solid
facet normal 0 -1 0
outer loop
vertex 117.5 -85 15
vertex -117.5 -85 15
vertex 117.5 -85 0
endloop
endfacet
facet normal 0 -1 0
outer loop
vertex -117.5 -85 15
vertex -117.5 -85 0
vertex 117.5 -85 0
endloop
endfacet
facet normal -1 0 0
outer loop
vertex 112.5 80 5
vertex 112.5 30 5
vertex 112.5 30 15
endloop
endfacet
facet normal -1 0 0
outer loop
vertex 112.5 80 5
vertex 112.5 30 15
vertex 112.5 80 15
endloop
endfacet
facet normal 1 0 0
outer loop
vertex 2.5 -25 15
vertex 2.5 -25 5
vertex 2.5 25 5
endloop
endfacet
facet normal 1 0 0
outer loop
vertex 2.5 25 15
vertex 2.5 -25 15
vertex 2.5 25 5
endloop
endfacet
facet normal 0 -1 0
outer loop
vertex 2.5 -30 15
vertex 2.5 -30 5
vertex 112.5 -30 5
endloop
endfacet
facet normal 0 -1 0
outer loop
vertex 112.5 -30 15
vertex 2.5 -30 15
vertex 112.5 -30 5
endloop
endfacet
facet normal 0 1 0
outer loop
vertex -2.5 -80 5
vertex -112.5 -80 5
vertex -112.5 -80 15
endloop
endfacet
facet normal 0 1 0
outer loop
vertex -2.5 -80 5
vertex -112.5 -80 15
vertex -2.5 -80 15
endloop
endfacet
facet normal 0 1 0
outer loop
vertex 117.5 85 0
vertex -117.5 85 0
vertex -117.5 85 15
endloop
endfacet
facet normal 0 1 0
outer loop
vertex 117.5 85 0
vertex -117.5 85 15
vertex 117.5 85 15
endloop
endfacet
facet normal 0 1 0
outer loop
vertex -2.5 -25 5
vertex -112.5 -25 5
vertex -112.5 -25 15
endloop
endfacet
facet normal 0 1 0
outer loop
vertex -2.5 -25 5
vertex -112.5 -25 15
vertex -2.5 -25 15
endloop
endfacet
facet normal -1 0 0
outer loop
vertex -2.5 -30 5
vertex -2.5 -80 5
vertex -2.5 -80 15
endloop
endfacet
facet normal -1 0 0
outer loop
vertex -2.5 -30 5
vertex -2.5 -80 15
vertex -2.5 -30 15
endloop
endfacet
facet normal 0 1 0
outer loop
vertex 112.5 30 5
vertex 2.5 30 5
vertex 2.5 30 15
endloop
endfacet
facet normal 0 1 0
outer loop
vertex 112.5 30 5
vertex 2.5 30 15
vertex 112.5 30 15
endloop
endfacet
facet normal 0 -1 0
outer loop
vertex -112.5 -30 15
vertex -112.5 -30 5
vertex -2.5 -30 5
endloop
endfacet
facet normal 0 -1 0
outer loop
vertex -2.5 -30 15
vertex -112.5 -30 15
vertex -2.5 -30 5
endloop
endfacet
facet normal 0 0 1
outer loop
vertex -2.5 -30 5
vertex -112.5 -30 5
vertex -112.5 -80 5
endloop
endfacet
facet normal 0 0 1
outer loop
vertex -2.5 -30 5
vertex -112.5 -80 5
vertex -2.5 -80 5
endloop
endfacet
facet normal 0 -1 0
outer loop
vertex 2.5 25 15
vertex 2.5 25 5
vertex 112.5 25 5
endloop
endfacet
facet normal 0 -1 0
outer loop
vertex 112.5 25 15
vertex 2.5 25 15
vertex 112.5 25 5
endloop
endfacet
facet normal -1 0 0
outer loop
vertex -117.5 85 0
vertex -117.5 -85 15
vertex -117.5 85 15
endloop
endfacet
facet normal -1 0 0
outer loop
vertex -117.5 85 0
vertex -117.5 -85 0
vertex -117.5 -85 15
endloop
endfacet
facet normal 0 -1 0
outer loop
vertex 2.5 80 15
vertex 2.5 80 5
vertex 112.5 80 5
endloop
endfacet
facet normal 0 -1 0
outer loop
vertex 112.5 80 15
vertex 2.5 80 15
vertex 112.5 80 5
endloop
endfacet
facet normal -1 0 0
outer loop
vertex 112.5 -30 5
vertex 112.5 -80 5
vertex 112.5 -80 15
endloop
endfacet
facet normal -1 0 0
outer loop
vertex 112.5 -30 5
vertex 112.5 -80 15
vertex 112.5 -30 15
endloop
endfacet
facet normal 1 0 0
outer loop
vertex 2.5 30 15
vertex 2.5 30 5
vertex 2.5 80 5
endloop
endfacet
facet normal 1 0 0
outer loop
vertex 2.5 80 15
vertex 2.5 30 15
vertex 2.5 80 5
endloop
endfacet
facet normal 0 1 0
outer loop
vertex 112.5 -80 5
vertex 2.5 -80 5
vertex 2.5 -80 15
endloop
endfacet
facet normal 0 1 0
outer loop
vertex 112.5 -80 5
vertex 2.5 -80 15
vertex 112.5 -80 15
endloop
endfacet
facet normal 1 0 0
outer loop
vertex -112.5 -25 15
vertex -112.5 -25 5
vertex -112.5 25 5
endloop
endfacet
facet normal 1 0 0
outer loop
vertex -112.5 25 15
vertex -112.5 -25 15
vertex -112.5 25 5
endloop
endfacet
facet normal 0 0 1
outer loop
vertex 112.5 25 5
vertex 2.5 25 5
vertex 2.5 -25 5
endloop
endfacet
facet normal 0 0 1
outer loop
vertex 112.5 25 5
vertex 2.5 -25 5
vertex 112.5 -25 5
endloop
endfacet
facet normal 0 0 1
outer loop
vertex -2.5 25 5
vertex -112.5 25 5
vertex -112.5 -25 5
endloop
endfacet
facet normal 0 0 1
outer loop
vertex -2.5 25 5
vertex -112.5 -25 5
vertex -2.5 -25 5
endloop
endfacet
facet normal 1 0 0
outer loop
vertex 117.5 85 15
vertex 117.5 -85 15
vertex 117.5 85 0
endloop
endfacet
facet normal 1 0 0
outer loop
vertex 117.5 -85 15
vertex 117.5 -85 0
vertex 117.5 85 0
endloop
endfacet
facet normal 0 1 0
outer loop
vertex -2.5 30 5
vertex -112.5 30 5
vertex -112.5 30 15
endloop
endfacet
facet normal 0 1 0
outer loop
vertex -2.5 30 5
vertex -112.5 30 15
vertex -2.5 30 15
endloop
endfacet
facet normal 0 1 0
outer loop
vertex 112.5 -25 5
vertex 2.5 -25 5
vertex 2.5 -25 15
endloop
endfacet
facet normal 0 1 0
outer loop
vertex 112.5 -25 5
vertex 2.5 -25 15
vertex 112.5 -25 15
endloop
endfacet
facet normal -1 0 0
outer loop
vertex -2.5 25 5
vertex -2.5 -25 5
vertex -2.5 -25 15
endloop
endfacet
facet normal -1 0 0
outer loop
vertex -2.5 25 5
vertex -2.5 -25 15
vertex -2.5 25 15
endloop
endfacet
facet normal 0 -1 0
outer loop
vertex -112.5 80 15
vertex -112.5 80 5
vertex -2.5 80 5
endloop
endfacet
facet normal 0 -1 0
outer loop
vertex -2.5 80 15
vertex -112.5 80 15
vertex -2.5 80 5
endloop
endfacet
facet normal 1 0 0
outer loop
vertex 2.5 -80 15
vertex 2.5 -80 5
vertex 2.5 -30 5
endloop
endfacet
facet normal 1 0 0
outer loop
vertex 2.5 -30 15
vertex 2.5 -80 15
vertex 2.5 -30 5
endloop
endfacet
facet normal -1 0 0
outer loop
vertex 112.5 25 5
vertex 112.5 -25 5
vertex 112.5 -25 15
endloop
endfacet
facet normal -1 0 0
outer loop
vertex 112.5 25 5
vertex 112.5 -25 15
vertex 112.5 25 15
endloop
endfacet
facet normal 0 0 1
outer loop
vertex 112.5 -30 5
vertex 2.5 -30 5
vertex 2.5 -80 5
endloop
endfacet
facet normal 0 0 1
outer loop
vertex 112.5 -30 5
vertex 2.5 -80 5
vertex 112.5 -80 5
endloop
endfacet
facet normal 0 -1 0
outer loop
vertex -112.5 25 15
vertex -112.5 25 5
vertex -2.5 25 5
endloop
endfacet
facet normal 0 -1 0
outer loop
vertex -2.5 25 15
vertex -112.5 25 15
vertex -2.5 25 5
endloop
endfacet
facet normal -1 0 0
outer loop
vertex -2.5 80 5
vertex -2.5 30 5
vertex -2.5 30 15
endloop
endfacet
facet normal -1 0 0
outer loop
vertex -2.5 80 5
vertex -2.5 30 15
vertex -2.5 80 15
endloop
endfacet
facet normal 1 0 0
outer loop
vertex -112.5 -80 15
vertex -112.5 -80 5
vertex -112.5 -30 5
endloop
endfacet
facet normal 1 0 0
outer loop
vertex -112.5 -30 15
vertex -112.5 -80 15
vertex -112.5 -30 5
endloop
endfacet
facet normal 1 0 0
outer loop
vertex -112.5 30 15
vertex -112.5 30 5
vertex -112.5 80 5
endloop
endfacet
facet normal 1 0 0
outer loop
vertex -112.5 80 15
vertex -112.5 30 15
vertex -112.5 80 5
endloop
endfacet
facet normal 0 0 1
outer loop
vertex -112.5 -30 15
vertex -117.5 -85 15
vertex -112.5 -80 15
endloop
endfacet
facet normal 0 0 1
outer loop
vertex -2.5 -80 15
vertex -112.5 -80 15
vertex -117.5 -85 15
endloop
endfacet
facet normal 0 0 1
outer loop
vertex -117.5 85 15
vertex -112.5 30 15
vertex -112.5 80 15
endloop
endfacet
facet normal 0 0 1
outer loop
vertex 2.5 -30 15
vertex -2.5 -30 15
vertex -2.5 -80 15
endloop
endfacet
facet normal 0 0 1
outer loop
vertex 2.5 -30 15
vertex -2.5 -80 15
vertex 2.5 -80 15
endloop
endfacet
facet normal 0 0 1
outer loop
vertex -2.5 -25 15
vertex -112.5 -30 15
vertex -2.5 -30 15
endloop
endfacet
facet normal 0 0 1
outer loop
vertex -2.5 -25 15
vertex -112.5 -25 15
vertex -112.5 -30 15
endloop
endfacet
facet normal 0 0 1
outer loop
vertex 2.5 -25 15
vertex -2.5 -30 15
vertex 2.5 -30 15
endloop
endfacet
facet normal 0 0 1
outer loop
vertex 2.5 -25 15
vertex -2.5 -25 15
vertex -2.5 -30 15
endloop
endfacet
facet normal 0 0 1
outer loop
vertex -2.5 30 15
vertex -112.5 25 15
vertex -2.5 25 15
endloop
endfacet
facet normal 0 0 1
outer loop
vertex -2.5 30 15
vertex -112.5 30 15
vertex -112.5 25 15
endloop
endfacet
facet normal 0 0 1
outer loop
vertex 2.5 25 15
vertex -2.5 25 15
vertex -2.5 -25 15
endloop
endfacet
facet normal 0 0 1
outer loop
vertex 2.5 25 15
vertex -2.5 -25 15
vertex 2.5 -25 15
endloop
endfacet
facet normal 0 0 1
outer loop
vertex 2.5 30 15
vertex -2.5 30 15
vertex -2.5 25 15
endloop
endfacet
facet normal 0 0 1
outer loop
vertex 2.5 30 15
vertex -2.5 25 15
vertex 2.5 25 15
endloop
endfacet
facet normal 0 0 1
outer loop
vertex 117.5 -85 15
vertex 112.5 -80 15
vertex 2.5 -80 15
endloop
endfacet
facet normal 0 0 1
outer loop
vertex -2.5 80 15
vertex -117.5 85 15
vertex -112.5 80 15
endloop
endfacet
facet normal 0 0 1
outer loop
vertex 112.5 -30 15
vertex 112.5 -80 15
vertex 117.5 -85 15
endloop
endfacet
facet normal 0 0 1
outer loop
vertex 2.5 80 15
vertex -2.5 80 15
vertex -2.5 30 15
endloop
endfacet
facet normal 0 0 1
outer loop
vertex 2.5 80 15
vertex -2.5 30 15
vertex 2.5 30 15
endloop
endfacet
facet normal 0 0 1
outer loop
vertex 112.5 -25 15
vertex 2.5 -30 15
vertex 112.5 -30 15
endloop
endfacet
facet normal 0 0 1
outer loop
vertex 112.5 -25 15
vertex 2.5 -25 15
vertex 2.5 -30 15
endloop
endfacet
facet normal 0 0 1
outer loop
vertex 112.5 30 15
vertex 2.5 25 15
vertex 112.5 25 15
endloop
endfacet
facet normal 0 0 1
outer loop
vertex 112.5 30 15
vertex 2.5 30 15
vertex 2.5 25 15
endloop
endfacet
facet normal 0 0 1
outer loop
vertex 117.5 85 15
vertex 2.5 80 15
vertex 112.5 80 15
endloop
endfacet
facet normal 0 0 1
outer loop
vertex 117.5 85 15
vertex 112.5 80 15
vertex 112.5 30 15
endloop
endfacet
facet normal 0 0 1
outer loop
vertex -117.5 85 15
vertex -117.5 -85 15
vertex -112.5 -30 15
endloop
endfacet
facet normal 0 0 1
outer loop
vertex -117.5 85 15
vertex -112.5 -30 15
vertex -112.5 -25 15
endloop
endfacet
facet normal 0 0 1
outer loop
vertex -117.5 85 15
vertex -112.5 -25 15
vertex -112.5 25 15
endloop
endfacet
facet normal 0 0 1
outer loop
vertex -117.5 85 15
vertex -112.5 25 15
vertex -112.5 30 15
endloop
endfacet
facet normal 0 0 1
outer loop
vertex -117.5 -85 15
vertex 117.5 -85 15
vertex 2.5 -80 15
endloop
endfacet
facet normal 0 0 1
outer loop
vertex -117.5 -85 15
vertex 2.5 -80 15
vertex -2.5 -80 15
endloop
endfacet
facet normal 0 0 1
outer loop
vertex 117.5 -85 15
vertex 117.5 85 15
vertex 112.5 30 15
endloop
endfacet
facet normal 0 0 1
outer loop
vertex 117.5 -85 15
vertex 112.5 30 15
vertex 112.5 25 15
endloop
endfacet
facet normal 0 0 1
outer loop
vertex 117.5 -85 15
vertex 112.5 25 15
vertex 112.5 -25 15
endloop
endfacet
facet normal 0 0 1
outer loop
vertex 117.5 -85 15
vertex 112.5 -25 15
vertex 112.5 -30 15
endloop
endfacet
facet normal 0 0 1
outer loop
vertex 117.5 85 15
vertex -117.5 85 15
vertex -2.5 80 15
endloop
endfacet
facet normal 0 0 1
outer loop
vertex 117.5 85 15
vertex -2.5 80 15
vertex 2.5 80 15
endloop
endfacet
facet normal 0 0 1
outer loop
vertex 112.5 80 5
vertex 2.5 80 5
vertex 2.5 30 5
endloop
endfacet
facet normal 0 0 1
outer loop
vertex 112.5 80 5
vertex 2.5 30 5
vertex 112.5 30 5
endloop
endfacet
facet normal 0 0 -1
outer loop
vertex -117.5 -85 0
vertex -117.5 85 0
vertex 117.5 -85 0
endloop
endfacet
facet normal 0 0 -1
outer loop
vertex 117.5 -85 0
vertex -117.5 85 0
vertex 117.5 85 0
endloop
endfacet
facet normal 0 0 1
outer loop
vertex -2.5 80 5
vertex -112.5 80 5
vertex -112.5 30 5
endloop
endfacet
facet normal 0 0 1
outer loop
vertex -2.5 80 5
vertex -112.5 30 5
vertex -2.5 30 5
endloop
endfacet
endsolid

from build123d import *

# Parameters (mm, degrees)
F0_W     = 235
F0_H     = 170
F1_DEPTH = 5
F2_W     = 235
F2_H     = 170
F2_W_2   = 110
F2_H_2   = 50
F3_DEPTH = 10


with BuildPart() as f1:
    # F0 (on Top) → F1 (new body)
    with BuildSketch(Plane.XY):
        Rectangle(F0_W, F0_H)
    extrude(amount=F1_DEPTH)

    # F2 (on face) → F3 (join)
    with BuildSketch(Plane.XY.offset(5)):
        Rectangle(F2_W, F2_H)
        with Locations((-57.5, -55)):
            Rectangle(F2_W_2, F2_H_2, mode=Mode.SUBTRACT)
        with Locations((57.5, -55)):
            Rectangle(F2_W_2, F2_H_2, mode=Mode.SUBTRACT)
        with Locations((-57.5, 0)):
            Rectangle(F2_W_2, F2_H_2, mode=Mode.SUBTRACT)
        with Locations((-57.5, 55)):
            Rectangle(F2_W_2, F2_H_2, mode=Mode.SUBTRACT)
        with Locations((57.5, 0)):
            Rectangle(F2_W_2, F2_H_2, mode=Mode.SUBTRACT)
        with Locations((57.5, 55)):
            Rectangle(F2_W_2, F2_H_2, mode=Mode.SUBTRACT)
    extrude(amount=F3_DEPTH)


solid = f1.part
